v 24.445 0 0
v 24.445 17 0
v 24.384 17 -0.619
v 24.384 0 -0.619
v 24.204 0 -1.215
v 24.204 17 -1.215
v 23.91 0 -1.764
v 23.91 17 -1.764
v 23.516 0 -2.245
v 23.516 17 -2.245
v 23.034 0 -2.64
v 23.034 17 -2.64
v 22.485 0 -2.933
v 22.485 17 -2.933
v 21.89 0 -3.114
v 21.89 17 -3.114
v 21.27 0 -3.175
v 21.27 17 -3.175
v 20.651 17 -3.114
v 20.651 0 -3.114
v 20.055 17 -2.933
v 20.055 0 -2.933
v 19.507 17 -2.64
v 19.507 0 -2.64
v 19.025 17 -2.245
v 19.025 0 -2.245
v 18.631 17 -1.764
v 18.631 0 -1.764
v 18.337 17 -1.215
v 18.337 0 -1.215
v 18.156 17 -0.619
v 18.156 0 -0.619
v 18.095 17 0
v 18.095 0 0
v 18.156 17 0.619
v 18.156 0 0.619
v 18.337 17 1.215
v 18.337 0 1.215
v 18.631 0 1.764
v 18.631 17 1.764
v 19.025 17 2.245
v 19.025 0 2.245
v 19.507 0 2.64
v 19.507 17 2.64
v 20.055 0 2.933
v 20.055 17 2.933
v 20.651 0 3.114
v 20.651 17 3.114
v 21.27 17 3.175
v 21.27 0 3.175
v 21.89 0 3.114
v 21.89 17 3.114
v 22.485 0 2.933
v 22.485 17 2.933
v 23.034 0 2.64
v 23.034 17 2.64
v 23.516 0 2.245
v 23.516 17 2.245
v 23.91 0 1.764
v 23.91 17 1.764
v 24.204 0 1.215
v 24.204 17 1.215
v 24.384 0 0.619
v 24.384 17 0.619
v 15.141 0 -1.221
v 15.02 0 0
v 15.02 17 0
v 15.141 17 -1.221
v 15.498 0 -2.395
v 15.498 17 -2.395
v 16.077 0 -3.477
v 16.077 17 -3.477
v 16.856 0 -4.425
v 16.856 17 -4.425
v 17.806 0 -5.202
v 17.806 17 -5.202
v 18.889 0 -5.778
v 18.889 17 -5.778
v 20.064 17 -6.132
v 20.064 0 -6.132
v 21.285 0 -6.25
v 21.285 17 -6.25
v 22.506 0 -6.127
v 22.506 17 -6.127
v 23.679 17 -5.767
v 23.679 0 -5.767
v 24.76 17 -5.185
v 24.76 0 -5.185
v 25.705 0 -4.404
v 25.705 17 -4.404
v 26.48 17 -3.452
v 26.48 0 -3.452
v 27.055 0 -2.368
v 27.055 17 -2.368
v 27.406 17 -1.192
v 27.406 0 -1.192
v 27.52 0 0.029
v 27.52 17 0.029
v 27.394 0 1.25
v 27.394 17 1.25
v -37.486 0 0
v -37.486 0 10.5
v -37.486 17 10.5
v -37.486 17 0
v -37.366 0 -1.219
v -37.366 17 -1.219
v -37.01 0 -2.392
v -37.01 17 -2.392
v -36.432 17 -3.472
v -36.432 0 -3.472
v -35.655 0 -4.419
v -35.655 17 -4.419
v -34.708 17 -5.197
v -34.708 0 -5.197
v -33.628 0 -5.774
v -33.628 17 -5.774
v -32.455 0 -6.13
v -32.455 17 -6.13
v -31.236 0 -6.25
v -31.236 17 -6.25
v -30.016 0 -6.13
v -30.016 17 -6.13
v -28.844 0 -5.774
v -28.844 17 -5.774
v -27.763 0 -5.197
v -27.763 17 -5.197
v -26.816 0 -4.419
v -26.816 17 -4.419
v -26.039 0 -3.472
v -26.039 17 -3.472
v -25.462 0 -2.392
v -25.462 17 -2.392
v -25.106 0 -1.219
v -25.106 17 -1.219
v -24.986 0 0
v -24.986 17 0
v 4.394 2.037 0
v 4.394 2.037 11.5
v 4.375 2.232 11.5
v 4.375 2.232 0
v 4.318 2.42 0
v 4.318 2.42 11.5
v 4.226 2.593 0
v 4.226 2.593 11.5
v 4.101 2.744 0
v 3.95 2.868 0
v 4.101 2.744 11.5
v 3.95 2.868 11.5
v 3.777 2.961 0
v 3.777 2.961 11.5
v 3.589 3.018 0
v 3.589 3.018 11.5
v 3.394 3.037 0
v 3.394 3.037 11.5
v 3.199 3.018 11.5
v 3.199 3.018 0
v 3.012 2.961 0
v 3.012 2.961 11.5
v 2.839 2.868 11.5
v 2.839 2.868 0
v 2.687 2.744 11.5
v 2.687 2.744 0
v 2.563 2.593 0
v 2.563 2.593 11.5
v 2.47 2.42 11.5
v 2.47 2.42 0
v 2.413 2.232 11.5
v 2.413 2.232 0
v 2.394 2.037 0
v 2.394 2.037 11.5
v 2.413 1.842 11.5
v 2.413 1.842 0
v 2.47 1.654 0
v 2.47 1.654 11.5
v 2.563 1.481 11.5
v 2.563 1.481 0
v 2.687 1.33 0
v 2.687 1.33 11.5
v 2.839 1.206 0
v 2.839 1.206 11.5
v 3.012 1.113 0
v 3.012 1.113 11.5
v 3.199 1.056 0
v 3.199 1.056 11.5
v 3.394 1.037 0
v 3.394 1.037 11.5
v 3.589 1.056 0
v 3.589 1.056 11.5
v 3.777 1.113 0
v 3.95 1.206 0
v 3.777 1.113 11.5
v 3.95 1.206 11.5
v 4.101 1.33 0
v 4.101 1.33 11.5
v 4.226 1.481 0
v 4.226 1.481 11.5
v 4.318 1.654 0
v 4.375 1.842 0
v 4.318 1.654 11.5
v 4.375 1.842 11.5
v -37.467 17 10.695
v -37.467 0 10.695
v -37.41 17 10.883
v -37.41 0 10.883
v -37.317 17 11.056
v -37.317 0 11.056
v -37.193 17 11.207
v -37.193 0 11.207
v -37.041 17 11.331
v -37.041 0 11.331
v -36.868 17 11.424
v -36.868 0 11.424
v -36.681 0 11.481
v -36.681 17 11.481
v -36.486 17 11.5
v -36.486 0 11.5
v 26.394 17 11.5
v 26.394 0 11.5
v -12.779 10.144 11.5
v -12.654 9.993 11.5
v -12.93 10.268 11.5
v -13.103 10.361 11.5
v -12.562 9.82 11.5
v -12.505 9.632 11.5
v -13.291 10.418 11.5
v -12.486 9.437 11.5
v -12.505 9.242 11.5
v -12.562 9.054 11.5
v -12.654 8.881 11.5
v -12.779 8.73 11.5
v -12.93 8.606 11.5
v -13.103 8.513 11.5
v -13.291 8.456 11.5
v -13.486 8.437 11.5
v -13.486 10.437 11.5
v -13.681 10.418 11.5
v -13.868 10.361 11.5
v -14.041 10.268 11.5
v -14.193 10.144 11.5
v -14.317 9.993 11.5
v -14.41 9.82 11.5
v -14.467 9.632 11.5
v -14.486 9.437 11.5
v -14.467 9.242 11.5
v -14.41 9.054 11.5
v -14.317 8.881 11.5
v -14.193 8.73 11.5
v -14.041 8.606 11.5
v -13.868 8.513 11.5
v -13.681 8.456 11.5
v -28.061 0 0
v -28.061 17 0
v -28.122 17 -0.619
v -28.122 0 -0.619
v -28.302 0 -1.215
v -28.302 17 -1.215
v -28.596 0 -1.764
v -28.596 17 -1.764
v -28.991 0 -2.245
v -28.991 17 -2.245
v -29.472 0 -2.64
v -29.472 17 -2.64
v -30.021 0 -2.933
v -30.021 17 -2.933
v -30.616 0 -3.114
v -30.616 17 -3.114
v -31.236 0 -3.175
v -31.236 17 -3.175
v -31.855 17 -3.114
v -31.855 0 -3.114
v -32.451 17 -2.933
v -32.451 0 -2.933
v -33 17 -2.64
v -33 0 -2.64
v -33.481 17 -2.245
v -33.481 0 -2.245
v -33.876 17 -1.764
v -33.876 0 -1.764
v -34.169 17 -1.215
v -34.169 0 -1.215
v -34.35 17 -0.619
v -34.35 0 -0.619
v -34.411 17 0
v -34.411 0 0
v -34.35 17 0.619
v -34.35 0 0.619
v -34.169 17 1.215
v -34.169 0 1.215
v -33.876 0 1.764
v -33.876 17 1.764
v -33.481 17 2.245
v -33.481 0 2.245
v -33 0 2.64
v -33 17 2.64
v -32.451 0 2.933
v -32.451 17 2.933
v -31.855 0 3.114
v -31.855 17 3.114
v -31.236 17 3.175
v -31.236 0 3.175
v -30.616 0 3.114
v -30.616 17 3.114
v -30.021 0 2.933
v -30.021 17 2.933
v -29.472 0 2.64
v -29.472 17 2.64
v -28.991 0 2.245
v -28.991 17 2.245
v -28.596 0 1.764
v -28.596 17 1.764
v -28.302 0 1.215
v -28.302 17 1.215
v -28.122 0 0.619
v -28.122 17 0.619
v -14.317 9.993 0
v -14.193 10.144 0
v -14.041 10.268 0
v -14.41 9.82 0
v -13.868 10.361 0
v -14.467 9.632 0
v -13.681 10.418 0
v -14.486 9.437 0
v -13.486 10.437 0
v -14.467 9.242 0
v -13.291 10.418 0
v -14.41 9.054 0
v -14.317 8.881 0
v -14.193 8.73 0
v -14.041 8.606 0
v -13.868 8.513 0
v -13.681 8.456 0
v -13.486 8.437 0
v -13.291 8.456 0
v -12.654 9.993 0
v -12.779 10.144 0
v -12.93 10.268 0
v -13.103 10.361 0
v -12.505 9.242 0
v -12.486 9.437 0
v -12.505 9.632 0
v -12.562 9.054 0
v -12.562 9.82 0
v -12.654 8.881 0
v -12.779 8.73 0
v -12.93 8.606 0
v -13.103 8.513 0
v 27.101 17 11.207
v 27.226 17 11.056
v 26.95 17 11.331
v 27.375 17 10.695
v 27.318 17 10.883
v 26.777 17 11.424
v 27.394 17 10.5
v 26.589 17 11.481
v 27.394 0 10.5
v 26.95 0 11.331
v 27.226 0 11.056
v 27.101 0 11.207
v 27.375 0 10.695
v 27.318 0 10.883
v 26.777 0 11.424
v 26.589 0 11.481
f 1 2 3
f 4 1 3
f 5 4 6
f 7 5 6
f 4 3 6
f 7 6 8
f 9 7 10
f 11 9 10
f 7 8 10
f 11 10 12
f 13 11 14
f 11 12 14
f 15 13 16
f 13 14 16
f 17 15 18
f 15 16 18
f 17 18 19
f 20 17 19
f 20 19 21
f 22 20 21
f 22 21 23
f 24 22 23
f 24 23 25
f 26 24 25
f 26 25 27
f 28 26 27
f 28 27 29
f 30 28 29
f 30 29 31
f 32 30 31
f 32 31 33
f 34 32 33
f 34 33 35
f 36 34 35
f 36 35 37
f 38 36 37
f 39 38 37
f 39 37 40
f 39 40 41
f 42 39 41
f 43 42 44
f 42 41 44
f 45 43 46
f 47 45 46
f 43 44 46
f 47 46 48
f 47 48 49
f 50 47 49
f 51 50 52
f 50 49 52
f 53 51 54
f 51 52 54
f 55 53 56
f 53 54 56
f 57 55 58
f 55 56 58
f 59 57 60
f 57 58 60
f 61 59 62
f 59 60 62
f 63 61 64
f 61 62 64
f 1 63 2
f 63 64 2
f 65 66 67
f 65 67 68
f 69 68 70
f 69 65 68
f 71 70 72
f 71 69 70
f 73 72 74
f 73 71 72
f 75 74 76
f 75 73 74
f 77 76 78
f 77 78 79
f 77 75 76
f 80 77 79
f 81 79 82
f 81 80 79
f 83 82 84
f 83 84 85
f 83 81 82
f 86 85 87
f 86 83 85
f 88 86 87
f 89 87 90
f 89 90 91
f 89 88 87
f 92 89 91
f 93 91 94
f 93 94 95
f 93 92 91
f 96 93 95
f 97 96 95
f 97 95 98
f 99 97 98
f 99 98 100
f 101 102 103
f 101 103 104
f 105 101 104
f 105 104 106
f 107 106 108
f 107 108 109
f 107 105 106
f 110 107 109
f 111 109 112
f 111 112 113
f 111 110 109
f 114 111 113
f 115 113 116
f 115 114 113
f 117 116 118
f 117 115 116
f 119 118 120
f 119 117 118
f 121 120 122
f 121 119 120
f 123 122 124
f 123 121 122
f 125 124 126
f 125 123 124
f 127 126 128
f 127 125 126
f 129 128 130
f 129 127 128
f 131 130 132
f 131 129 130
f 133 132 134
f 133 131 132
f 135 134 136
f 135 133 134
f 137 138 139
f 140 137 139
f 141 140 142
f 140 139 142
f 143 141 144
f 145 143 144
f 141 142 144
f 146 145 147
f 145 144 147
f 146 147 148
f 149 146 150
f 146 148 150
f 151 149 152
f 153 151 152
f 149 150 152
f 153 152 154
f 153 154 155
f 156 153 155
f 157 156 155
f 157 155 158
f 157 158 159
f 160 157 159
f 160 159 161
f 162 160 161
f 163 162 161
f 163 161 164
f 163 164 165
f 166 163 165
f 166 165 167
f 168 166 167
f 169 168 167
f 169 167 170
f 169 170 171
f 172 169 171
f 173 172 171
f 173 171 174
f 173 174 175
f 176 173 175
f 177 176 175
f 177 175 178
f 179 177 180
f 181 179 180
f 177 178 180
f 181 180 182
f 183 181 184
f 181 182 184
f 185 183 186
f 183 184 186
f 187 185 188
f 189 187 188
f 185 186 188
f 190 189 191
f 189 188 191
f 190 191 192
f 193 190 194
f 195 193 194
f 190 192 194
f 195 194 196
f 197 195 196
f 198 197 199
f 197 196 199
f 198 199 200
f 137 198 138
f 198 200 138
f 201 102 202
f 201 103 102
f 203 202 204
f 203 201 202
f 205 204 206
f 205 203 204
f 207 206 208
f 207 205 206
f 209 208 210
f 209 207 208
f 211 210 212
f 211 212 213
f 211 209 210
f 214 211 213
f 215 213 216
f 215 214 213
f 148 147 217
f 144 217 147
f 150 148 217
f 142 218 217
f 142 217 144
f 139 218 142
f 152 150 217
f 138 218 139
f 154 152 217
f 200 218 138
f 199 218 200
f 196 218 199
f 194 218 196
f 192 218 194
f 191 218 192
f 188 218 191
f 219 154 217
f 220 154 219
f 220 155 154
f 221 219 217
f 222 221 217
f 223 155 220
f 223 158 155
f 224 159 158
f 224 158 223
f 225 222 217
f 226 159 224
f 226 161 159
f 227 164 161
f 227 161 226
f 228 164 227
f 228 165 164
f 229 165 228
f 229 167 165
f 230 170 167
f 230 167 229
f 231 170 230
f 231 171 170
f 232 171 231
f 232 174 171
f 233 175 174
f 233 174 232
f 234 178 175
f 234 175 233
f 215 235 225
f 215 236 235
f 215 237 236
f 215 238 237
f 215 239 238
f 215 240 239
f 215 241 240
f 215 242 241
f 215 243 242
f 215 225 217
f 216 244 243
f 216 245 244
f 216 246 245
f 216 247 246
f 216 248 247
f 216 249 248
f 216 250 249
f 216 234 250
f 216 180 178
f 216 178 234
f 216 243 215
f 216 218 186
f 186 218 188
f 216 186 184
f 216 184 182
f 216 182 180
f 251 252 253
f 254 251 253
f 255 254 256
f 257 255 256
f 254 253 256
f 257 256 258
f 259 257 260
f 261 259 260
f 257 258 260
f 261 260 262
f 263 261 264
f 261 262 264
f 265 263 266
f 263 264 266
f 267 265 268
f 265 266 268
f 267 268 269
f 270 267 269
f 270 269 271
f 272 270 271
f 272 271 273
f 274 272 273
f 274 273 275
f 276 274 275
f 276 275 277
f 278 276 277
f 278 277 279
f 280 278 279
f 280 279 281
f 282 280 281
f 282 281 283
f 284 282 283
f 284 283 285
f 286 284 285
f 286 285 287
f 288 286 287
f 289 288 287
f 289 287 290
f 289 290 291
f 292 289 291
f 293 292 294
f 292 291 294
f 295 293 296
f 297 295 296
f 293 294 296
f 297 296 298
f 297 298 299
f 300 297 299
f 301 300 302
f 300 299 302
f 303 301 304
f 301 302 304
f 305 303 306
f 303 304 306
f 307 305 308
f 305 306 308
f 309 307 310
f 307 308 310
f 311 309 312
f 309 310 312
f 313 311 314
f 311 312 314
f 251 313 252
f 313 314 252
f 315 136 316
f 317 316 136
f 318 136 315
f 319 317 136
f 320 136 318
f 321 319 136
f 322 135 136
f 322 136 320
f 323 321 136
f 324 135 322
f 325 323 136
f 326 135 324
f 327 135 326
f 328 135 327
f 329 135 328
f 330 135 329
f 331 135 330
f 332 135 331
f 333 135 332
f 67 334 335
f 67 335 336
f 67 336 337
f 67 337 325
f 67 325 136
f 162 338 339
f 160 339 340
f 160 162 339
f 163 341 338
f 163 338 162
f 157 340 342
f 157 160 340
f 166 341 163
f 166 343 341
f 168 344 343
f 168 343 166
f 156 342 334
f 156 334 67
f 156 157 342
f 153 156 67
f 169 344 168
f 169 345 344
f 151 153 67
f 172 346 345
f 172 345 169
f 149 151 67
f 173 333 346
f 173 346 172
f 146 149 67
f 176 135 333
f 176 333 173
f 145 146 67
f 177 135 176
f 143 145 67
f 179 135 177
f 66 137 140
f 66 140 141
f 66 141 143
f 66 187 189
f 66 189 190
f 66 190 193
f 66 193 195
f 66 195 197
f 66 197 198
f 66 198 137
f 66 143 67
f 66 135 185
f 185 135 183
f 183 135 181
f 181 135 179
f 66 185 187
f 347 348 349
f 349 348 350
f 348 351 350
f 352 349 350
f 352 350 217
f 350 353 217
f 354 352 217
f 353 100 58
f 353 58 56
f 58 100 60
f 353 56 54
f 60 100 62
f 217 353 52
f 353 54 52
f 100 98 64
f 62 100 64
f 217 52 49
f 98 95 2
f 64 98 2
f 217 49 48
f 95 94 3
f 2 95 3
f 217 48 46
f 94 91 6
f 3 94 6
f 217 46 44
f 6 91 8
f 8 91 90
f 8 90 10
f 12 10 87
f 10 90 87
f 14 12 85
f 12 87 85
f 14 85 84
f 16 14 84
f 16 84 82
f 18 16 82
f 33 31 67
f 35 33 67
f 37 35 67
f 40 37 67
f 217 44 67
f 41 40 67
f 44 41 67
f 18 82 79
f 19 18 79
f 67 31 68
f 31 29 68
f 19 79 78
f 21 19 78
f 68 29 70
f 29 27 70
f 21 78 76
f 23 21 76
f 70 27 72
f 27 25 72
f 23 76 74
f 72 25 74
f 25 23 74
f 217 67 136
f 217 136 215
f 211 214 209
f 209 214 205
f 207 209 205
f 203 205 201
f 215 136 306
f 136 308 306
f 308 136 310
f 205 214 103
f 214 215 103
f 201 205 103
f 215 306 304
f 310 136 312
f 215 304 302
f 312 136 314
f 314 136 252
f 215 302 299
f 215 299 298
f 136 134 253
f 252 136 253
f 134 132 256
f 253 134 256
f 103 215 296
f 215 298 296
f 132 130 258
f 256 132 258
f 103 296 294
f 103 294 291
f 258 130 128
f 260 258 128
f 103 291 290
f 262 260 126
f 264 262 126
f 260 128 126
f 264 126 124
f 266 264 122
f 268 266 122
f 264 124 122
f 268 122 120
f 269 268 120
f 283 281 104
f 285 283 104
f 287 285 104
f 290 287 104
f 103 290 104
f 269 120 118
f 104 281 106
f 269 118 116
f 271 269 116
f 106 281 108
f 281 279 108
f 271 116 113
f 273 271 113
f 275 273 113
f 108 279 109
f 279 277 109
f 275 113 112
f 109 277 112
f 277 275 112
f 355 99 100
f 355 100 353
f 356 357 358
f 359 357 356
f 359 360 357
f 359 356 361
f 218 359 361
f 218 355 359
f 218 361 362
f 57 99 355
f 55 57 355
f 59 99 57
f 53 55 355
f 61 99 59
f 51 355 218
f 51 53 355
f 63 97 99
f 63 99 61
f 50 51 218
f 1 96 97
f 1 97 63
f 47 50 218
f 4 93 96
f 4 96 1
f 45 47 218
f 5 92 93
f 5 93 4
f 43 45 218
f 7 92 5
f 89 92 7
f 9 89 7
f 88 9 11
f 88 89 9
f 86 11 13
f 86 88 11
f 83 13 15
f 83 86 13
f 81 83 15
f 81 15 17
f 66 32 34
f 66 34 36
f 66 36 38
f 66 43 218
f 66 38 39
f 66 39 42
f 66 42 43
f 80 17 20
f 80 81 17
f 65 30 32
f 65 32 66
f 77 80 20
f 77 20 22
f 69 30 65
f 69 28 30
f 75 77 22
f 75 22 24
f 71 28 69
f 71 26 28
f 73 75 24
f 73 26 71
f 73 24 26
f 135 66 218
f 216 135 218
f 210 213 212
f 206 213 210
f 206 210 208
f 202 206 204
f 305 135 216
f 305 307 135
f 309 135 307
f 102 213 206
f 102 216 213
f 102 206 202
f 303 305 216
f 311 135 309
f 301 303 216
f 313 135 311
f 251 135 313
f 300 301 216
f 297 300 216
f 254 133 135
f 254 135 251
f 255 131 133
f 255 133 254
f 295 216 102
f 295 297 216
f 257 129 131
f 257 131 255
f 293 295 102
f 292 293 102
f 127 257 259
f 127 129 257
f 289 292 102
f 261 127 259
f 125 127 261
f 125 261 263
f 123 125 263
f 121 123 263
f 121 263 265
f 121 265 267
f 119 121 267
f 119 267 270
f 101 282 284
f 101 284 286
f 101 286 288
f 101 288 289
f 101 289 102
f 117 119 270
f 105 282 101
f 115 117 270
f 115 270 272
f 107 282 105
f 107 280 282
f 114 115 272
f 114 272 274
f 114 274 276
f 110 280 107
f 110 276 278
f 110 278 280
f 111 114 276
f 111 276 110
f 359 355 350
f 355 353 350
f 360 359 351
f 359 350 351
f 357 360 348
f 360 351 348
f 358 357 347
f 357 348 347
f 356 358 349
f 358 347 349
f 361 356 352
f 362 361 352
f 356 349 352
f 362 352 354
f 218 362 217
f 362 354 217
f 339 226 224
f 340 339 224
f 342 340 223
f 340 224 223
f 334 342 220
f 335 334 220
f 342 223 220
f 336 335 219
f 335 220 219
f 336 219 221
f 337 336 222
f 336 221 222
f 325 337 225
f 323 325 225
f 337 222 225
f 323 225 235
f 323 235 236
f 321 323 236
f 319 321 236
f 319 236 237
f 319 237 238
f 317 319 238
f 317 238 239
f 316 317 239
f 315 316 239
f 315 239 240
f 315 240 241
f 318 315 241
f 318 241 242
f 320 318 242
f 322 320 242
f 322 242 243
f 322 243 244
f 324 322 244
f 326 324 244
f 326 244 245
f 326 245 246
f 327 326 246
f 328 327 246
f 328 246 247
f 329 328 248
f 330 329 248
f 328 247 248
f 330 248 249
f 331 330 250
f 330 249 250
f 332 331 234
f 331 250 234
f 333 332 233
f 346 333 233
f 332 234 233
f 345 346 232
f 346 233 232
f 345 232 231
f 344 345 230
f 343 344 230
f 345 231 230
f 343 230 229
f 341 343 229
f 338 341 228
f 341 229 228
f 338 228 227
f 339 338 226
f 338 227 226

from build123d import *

# Parameters (mm, degrees)
BOSS_EXTRUDE1_DEPTH = 17
SKETCH2_R           = 3.175
CUT_EXTRUDE1_DEPTH  = 18
SKETCH4_R           = 1
CUT_EXTRUDE3_DEPTH  = 18.75
FILLET1_R           = 1


with BuildPart() as part:
    # Sketch1 → Boss-Extrude1 (new body)
    with BuildSketch(Plane(origin=(0, 0, 0), x_dir=(1, 0, 0), z_dir=(0, 1, 0))):
        with BuildLine():
            Line((-24.985807588, 0), (15.020468055, 0))
            ThreePointArc((15.020468055, 0), (21.898649068, 6.218350956), (27.394192412, -1.25))
            Line((27.394192412, -1.25), (27.394192412, -11.5))
            Line((27.394192412, -11.5), (-37.485807588, -11.5))
            Line((-37.485807588, -11.5), (-37.485807588, 0))
            ThreePointArc((-37.485807588, 0), (-31.235807588, 6.25), (-24.985807588, 0))
        make_face()
    extrude(amount=BOSS_EXTRUDE1_DEPTH)

    # Sketch2 → Cut-Extrude1 (cut, through all)
    with BuildSketch(Plane(origin=(0, 17, 0), x_dir=(1, 0, 0), z_dir=(0, 1, 0))):
        with Locations((-31.235807588, 0)):
            Circle(SKETCH2_R)
        with Locations((21.270468055, 0)):
            Circle(SKETCH2_R)
    extrude(amount=-CUT_EXTRUDE1_DEPTH, mode=Mode.SUBTRACT)

    # Sketch4 → Cut-Extrude3 (cut, through all)
    with BuildSketch(Plane.XY.offset(11.5)):
        with Locations((-13.485807588, 9.437)):
            Circle(SKETCH4_R)
        with Locations((3.394192412, 2.037)):
            Circle(SKETCH4_R)
    extrude(amount=-CUT_EXTRUDE3_DEPTH, mode=Mode.SUBTRACT)

    # Fillet1
    fillet1_edges = [part.edges().sort_by_distance(p)[0] for p in [
        (27.394192412, 8.5, 11.5),
        (-37.485807588, 8.5, 11.5),
    ]]
    fillet(fillet1_edges, radius=FILLET1_R)


solid = part.part
